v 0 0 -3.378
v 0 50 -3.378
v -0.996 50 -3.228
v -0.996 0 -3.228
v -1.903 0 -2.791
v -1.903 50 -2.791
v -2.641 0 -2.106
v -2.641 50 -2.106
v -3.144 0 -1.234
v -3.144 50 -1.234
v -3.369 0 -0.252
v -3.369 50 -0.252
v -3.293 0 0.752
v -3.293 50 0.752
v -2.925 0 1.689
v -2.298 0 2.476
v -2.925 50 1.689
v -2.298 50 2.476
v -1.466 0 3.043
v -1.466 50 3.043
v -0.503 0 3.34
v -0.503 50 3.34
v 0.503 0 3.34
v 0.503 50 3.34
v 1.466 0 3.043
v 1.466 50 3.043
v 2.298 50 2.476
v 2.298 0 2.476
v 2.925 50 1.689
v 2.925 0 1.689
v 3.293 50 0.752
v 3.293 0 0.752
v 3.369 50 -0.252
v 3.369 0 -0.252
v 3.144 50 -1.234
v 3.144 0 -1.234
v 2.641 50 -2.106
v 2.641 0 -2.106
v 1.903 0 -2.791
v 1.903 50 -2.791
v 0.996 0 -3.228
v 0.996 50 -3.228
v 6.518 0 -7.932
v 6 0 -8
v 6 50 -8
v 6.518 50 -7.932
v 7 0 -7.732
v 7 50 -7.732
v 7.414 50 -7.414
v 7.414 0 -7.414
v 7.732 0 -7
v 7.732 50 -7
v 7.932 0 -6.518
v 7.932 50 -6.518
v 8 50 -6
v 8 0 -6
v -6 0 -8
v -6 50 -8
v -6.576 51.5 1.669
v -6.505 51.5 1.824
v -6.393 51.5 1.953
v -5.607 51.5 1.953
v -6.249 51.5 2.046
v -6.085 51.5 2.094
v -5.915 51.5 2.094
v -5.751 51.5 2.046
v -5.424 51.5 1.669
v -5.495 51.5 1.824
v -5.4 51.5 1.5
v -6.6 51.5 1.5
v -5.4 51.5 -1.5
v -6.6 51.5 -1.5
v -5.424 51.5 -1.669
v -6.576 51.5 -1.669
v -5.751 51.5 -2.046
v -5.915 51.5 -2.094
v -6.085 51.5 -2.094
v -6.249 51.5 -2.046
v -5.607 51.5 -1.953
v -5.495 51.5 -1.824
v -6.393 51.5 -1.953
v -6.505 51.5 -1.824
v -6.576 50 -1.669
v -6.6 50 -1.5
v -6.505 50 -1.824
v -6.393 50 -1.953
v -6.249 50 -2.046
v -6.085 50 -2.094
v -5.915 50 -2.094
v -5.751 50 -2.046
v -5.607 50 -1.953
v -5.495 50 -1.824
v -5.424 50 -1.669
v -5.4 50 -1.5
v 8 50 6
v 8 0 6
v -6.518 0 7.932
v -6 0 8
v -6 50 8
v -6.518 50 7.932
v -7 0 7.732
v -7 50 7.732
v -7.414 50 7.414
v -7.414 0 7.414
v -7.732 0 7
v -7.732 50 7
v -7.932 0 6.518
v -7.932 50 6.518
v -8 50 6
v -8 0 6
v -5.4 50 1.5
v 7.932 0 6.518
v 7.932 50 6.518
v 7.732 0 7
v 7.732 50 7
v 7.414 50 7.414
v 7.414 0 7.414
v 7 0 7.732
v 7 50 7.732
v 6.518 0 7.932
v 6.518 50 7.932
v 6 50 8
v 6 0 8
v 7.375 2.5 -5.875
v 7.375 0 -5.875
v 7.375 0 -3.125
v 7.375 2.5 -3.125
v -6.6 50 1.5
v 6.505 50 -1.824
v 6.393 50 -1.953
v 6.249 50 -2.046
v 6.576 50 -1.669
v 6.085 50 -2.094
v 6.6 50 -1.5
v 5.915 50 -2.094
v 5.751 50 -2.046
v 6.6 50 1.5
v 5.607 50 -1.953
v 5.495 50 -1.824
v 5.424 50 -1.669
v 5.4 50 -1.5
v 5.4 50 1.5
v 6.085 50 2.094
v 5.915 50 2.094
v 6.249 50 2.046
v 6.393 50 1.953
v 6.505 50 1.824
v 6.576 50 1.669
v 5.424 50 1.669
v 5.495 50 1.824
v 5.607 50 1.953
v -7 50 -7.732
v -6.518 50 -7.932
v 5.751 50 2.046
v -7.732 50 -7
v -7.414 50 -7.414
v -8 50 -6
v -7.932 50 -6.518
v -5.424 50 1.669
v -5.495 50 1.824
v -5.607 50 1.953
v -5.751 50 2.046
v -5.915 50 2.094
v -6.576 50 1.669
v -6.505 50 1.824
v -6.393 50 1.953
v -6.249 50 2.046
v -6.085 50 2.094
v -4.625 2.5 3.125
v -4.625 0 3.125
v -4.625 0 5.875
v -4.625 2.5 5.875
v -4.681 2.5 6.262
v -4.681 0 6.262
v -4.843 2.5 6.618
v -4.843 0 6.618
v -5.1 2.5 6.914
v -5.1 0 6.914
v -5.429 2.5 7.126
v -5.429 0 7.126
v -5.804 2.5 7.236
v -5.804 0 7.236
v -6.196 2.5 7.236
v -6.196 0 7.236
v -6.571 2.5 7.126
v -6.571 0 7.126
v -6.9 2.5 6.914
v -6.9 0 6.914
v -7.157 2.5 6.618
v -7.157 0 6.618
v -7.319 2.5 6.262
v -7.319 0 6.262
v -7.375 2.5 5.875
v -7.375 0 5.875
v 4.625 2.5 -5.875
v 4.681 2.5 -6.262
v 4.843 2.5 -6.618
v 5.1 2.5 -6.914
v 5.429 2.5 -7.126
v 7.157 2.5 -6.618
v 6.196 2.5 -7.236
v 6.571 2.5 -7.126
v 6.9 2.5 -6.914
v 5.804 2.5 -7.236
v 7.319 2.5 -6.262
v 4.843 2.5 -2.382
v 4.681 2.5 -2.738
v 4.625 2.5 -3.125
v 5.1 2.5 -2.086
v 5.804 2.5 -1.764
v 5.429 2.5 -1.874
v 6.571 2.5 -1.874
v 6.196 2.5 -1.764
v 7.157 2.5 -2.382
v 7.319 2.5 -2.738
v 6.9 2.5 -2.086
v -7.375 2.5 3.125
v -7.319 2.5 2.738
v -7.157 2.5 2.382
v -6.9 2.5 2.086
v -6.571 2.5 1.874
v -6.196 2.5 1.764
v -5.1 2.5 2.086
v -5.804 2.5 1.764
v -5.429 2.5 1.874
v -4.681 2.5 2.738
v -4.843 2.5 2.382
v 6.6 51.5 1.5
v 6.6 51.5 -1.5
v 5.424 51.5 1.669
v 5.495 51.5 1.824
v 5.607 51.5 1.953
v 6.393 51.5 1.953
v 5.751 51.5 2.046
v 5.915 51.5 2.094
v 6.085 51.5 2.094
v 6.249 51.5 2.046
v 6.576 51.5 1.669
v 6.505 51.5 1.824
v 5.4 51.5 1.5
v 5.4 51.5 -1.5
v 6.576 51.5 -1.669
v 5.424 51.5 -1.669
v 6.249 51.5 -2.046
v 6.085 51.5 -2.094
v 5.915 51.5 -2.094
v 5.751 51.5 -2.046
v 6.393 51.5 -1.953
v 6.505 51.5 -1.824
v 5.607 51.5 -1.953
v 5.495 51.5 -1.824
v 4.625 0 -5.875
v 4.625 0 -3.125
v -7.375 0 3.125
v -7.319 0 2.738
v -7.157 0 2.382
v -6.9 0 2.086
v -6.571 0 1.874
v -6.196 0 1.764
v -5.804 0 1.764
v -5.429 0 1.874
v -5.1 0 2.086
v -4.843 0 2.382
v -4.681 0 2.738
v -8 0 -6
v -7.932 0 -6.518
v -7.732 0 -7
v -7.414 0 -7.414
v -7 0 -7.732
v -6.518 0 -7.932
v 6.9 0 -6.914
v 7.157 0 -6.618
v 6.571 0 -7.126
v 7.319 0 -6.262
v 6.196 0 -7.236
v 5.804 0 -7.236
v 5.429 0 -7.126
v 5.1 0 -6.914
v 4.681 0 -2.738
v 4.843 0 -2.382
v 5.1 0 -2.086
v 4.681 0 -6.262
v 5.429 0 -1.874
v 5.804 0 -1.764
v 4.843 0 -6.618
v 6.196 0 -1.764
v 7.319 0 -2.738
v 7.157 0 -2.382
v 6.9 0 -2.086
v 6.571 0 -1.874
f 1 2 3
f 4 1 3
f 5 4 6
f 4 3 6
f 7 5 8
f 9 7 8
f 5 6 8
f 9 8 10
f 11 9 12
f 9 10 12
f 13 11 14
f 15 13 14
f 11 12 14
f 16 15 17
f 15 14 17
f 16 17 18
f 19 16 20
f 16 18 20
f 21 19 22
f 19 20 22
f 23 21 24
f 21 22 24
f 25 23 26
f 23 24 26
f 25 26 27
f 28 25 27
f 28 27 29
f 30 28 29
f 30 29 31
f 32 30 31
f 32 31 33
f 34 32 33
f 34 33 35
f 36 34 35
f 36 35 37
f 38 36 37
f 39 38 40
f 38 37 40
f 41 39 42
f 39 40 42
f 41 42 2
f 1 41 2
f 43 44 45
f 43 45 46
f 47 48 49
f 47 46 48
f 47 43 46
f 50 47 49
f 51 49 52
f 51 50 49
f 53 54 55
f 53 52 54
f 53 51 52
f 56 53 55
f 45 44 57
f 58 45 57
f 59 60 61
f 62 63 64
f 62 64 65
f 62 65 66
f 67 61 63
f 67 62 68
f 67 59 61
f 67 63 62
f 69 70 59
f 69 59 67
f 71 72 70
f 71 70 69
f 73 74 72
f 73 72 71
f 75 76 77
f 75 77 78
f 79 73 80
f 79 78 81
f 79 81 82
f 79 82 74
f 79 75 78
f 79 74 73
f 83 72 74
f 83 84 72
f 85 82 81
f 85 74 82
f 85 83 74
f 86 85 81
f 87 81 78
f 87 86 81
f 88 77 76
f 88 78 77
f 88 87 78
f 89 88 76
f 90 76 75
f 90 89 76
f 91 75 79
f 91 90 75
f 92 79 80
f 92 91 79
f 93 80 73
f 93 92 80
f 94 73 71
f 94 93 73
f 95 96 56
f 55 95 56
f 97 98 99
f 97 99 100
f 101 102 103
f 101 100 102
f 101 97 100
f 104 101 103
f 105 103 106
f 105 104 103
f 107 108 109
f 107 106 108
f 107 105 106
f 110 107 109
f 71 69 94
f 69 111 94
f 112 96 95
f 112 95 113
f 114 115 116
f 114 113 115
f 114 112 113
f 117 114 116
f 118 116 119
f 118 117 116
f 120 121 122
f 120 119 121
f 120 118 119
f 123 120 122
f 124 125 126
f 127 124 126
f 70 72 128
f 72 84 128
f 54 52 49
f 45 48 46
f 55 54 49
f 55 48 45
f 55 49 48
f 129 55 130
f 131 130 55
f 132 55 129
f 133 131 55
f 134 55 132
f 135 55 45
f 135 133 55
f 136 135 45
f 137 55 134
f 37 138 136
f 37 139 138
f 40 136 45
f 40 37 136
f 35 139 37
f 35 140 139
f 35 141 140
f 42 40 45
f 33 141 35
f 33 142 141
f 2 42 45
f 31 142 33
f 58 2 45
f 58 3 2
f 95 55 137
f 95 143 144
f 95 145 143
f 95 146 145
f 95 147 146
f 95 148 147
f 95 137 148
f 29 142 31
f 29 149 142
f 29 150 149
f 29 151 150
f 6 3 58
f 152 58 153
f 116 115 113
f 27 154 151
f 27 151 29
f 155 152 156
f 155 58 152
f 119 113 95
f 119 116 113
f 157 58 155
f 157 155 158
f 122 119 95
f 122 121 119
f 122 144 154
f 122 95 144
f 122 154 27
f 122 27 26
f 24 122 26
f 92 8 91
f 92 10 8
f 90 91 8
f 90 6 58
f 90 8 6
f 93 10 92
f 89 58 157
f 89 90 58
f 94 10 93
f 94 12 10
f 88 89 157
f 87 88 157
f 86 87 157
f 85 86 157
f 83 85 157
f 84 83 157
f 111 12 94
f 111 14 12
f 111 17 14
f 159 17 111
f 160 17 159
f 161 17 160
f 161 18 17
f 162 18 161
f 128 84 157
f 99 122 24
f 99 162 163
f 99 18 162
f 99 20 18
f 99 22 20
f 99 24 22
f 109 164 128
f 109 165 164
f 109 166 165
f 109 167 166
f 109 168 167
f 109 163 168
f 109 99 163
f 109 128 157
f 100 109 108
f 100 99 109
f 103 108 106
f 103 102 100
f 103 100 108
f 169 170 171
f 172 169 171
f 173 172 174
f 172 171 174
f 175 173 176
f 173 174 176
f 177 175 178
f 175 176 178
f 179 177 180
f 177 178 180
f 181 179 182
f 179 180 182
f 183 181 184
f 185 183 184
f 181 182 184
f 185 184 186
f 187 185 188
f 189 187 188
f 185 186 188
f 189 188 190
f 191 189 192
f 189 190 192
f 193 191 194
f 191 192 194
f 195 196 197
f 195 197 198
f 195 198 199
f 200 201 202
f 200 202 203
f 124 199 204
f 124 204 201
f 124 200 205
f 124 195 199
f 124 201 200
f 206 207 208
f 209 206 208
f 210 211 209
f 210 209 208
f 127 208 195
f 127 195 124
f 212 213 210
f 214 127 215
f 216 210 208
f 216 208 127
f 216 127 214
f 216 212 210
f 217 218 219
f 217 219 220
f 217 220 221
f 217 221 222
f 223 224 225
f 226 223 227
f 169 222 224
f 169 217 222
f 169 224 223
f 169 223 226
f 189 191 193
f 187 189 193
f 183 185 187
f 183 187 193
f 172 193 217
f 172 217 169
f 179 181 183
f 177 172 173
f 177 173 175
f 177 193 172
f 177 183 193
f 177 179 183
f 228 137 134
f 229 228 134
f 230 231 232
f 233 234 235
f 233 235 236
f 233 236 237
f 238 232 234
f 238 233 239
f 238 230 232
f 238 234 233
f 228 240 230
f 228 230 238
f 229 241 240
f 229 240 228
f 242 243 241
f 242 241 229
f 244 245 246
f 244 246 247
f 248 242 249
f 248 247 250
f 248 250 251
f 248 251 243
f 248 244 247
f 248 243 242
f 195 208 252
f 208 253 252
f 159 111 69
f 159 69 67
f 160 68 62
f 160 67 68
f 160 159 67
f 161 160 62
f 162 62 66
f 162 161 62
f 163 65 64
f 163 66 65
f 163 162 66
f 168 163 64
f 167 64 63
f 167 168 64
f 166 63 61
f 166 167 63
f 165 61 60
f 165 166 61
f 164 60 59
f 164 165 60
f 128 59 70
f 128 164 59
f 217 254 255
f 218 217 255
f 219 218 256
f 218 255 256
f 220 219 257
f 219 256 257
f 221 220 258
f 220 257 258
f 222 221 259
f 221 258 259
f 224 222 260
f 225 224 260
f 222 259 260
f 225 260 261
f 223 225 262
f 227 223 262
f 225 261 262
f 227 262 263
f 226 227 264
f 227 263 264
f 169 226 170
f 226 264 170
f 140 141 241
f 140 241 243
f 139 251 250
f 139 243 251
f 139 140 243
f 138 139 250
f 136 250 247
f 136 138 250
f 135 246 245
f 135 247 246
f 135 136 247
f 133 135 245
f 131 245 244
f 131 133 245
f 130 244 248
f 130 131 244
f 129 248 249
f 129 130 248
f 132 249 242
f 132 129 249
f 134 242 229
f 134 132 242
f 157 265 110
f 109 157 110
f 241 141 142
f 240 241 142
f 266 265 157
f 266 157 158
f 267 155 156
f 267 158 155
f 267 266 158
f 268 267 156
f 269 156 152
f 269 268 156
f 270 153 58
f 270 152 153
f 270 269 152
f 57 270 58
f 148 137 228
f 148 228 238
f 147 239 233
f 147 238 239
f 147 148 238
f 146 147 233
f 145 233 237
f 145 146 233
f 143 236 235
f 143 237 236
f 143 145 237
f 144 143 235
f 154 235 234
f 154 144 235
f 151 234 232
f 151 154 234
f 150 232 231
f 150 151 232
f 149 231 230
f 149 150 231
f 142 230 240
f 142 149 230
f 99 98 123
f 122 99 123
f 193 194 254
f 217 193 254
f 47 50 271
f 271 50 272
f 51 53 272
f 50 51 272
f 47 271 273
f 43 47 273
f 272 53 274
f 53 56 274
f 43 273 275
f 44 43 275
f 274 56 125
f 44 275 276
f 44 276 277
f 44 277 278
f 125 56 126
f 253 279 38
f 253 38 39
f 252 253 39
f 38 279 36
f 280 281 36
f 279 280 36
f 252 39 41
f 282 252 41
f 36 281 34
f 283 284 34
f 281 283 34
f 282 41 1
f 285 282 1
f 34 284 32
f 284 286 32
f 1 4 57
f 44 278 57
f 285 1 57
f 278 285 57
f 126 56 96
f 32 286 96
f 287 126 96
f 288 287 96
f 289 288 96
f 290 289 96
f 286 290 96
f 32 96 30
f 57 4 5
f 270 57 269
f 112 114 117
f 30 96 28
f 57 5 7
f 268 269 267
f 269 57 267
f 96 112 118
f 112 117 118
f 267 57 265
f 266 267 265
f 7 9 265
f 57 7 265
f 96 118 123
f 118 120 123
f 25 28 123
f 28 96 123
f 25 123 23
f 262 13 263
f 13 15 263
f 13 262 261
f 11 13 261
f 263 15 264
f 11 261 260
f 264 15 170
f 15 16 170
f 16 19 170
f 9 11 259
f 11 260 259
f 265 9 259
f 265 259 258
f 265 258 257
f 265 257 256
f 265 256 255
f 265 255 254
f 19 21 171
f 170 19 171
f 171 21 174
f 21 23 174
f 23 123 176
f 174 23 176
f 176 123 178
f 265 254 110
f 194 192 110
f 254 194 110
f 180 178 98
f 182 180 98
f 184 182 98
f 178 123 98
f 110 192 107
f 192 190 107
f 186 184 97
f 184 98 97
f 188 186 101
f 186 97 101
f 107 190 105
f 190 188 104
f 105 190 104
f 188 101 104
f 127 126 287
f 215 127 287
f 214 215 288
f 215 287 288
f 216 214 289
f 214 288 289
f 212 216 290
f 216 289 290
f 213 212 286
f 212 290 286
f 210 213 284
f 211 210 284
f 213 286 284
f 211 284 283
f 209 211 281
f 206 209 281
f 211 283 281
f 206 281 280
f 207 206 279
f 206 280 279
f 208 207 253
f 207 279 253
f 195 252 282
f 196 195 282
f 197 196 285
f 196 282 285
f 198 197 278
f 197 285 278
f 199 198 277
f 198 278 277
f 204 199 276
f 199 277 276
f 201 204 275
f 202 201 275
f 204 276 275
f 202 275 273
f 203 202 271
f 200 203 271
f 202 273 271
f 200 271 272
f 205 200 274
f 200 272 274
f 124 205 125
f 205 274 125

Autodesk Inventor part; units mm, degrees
ref_plane "YZ Plane" through (0, 0, 0) normal (1, 0, 0) x (0, 1, 0)
ref_plane "XZ Plane" through (0, 0, 0) normal (0, 1, 0) x (-1, 0, 0)
ref_plane "XY Plane" through (0, 0, 0) normal (0, 0, 1) x (1, 0, 0)
sketch "Sketch1" plane through (0, 0, 0) normal (0, 1, 0) x (-1, 0, 0)
  line L0 (6, 8) -> (-6, 8)
  line L1 (-8, 6) -> (-8, -6)
  line L2 (-6, -8) -> (6, -8)
  line L3 (8, -6) -> (8, 6)
  arc A0 (8, 6) -> (6, 8) centre (6, 6) ccw
  arc A1 (-6, 8) -> (-8, 6) centre (-6, 6) ccw
  arc A2 (-8, -6) -> (-6, -8) centre (-6, -6) ccw
  arc A3 (6, -8) -> (8, -6) centre (6, -6) ccw
  point P0 (0, 0)
  point P1 (8, 8)
  point P2 (-8, 8)
  point P3 (8, -8)
  dimension "d0" = 16
  dimension "d1" = 16
  dimension "d2" = 8
  dimension "d3" = 8
  dimension "d4" = 2
extrude "Extrusion1" add sketch "Sketch1" along normal blind 50
sketch "Sketch2" plane through (0, 0, 0) normal (0, -1, 0) x (1, 0, 0)
  line L0 (-6, 5.875) -> (-6, 3.125) construction
  line L1 (-7.375, 5.875) -> (-7.375, 3.125)
  line L2 (-4.625, 3.125) -> (-4.625, 5.875)
  arc A0 (-4.625, 5.875) -> (-7.375, 5.875) centre (-6, 5.875) ccw
  arc A1 (-7.375, 3.125) -> (-4.625, 3.125) centre (-6, 3.125) ccw
  line L3 (6, -3.125) -> (6, -5.875) construction
  line L4 (4.625, -3.125) -> (4.625, -5.875)
  line L5 (7.375, -5.875) -> (7.375, -3.125)
  arc A2 (7.375, -3.125) -> (4.625, -3.125) centre (6, -3.125) ccw
  arc A3 (4.625, -5.875) -> (7.375, -5.875) centre (6, -5.875) ccw
  point P0 (0, 0)
  point P1 (0, 0)
  point P2 (-6, 4.5)
  point P3 (6, -4.5)
  dimension "d7" = 2.75
  dimension "d8" = 12
  dimension "d9" = 6
  dimension "d10" = 9
  dimension "d11" = 4.5
  dimension "d12" = 2.75
  dimension "d13" = 2.75
  dimension "d14" = 2.75
extrude "Extrusion2" cut sketch "Sketch2" against normal blind 2.5
hole "Hole1" at (0, 0, 0) direction (0, 1, 0) diameter 6.756 end through all clearance for "Flat Head Machine Screw (82)" size "1/4" standard "Ansi Unified Screw Threads"
sketch "Sketch3" plane through (0, 50, 0) normal (0, 1, 0) x (1, 0, 0)
  line L0 (-6, 1.5) -> (-6, -1.5) construction
  line L1 (-6.6, 1.5) -> (-6.6, -1.5)
  line L2 (-5.4, -1.5) -> (-5.4, 1.5)
  arc A0 (-5.4, 1.5) -> (-6.6, 1.5) centre (-6, 1.5) ccw
  arc A1 (-6.6, -1.5) -> (-5.4, -1.5) centre (-6, -1.5) ccw
  line L3 (6, 1.5) -> (6, -1.5) construction
  line L4 (5.4, 1.5) -> (5.4, -1.5)
  line L5 (6.6, -1.5) -> (6.6, 1.5)
  arc A2 (6.6, 1.5) -> (5.4, 1.5) centre (6, 1.5) ccw
  arc A3 (5.4, -1.5) -> (6.6, -1.5) centre (6, -1.5) ccw
  line L6 (-6, 0) -> (6, 0) construction
  line L7 (6, 8) -> (-6, 8) projected
  point P0 (0, 0)
  dimension "d25" = 0.6
  dimension "d26" = 0.6
  dimension "d27" = 3
  dimension "d29" = 0
  dimension "d30" = 12
  dimension "d31" = 6
  dimension "d32" = 3
extrude "Extrusion3" add sketch "Sketch3" along normal blind 1.5
equation "\"d1\" = d0"
equation "\"d2\" = 0.5 * d0"
equation "\"d3\" = d2"
equation "\"d9\" = 0.5 * d8"
equation "\"d11\" = 0.5 * d10"
equation "\"d12\" = d7"
equation "\"d13\" = d7"
equation "\"d14\" = d7"
equation "\"d26\" = d25"
equation "\"d27\" = d32"
equation "\"d31\" = 0.5 * d30"
properties part number "Camera Mount 30mm"
